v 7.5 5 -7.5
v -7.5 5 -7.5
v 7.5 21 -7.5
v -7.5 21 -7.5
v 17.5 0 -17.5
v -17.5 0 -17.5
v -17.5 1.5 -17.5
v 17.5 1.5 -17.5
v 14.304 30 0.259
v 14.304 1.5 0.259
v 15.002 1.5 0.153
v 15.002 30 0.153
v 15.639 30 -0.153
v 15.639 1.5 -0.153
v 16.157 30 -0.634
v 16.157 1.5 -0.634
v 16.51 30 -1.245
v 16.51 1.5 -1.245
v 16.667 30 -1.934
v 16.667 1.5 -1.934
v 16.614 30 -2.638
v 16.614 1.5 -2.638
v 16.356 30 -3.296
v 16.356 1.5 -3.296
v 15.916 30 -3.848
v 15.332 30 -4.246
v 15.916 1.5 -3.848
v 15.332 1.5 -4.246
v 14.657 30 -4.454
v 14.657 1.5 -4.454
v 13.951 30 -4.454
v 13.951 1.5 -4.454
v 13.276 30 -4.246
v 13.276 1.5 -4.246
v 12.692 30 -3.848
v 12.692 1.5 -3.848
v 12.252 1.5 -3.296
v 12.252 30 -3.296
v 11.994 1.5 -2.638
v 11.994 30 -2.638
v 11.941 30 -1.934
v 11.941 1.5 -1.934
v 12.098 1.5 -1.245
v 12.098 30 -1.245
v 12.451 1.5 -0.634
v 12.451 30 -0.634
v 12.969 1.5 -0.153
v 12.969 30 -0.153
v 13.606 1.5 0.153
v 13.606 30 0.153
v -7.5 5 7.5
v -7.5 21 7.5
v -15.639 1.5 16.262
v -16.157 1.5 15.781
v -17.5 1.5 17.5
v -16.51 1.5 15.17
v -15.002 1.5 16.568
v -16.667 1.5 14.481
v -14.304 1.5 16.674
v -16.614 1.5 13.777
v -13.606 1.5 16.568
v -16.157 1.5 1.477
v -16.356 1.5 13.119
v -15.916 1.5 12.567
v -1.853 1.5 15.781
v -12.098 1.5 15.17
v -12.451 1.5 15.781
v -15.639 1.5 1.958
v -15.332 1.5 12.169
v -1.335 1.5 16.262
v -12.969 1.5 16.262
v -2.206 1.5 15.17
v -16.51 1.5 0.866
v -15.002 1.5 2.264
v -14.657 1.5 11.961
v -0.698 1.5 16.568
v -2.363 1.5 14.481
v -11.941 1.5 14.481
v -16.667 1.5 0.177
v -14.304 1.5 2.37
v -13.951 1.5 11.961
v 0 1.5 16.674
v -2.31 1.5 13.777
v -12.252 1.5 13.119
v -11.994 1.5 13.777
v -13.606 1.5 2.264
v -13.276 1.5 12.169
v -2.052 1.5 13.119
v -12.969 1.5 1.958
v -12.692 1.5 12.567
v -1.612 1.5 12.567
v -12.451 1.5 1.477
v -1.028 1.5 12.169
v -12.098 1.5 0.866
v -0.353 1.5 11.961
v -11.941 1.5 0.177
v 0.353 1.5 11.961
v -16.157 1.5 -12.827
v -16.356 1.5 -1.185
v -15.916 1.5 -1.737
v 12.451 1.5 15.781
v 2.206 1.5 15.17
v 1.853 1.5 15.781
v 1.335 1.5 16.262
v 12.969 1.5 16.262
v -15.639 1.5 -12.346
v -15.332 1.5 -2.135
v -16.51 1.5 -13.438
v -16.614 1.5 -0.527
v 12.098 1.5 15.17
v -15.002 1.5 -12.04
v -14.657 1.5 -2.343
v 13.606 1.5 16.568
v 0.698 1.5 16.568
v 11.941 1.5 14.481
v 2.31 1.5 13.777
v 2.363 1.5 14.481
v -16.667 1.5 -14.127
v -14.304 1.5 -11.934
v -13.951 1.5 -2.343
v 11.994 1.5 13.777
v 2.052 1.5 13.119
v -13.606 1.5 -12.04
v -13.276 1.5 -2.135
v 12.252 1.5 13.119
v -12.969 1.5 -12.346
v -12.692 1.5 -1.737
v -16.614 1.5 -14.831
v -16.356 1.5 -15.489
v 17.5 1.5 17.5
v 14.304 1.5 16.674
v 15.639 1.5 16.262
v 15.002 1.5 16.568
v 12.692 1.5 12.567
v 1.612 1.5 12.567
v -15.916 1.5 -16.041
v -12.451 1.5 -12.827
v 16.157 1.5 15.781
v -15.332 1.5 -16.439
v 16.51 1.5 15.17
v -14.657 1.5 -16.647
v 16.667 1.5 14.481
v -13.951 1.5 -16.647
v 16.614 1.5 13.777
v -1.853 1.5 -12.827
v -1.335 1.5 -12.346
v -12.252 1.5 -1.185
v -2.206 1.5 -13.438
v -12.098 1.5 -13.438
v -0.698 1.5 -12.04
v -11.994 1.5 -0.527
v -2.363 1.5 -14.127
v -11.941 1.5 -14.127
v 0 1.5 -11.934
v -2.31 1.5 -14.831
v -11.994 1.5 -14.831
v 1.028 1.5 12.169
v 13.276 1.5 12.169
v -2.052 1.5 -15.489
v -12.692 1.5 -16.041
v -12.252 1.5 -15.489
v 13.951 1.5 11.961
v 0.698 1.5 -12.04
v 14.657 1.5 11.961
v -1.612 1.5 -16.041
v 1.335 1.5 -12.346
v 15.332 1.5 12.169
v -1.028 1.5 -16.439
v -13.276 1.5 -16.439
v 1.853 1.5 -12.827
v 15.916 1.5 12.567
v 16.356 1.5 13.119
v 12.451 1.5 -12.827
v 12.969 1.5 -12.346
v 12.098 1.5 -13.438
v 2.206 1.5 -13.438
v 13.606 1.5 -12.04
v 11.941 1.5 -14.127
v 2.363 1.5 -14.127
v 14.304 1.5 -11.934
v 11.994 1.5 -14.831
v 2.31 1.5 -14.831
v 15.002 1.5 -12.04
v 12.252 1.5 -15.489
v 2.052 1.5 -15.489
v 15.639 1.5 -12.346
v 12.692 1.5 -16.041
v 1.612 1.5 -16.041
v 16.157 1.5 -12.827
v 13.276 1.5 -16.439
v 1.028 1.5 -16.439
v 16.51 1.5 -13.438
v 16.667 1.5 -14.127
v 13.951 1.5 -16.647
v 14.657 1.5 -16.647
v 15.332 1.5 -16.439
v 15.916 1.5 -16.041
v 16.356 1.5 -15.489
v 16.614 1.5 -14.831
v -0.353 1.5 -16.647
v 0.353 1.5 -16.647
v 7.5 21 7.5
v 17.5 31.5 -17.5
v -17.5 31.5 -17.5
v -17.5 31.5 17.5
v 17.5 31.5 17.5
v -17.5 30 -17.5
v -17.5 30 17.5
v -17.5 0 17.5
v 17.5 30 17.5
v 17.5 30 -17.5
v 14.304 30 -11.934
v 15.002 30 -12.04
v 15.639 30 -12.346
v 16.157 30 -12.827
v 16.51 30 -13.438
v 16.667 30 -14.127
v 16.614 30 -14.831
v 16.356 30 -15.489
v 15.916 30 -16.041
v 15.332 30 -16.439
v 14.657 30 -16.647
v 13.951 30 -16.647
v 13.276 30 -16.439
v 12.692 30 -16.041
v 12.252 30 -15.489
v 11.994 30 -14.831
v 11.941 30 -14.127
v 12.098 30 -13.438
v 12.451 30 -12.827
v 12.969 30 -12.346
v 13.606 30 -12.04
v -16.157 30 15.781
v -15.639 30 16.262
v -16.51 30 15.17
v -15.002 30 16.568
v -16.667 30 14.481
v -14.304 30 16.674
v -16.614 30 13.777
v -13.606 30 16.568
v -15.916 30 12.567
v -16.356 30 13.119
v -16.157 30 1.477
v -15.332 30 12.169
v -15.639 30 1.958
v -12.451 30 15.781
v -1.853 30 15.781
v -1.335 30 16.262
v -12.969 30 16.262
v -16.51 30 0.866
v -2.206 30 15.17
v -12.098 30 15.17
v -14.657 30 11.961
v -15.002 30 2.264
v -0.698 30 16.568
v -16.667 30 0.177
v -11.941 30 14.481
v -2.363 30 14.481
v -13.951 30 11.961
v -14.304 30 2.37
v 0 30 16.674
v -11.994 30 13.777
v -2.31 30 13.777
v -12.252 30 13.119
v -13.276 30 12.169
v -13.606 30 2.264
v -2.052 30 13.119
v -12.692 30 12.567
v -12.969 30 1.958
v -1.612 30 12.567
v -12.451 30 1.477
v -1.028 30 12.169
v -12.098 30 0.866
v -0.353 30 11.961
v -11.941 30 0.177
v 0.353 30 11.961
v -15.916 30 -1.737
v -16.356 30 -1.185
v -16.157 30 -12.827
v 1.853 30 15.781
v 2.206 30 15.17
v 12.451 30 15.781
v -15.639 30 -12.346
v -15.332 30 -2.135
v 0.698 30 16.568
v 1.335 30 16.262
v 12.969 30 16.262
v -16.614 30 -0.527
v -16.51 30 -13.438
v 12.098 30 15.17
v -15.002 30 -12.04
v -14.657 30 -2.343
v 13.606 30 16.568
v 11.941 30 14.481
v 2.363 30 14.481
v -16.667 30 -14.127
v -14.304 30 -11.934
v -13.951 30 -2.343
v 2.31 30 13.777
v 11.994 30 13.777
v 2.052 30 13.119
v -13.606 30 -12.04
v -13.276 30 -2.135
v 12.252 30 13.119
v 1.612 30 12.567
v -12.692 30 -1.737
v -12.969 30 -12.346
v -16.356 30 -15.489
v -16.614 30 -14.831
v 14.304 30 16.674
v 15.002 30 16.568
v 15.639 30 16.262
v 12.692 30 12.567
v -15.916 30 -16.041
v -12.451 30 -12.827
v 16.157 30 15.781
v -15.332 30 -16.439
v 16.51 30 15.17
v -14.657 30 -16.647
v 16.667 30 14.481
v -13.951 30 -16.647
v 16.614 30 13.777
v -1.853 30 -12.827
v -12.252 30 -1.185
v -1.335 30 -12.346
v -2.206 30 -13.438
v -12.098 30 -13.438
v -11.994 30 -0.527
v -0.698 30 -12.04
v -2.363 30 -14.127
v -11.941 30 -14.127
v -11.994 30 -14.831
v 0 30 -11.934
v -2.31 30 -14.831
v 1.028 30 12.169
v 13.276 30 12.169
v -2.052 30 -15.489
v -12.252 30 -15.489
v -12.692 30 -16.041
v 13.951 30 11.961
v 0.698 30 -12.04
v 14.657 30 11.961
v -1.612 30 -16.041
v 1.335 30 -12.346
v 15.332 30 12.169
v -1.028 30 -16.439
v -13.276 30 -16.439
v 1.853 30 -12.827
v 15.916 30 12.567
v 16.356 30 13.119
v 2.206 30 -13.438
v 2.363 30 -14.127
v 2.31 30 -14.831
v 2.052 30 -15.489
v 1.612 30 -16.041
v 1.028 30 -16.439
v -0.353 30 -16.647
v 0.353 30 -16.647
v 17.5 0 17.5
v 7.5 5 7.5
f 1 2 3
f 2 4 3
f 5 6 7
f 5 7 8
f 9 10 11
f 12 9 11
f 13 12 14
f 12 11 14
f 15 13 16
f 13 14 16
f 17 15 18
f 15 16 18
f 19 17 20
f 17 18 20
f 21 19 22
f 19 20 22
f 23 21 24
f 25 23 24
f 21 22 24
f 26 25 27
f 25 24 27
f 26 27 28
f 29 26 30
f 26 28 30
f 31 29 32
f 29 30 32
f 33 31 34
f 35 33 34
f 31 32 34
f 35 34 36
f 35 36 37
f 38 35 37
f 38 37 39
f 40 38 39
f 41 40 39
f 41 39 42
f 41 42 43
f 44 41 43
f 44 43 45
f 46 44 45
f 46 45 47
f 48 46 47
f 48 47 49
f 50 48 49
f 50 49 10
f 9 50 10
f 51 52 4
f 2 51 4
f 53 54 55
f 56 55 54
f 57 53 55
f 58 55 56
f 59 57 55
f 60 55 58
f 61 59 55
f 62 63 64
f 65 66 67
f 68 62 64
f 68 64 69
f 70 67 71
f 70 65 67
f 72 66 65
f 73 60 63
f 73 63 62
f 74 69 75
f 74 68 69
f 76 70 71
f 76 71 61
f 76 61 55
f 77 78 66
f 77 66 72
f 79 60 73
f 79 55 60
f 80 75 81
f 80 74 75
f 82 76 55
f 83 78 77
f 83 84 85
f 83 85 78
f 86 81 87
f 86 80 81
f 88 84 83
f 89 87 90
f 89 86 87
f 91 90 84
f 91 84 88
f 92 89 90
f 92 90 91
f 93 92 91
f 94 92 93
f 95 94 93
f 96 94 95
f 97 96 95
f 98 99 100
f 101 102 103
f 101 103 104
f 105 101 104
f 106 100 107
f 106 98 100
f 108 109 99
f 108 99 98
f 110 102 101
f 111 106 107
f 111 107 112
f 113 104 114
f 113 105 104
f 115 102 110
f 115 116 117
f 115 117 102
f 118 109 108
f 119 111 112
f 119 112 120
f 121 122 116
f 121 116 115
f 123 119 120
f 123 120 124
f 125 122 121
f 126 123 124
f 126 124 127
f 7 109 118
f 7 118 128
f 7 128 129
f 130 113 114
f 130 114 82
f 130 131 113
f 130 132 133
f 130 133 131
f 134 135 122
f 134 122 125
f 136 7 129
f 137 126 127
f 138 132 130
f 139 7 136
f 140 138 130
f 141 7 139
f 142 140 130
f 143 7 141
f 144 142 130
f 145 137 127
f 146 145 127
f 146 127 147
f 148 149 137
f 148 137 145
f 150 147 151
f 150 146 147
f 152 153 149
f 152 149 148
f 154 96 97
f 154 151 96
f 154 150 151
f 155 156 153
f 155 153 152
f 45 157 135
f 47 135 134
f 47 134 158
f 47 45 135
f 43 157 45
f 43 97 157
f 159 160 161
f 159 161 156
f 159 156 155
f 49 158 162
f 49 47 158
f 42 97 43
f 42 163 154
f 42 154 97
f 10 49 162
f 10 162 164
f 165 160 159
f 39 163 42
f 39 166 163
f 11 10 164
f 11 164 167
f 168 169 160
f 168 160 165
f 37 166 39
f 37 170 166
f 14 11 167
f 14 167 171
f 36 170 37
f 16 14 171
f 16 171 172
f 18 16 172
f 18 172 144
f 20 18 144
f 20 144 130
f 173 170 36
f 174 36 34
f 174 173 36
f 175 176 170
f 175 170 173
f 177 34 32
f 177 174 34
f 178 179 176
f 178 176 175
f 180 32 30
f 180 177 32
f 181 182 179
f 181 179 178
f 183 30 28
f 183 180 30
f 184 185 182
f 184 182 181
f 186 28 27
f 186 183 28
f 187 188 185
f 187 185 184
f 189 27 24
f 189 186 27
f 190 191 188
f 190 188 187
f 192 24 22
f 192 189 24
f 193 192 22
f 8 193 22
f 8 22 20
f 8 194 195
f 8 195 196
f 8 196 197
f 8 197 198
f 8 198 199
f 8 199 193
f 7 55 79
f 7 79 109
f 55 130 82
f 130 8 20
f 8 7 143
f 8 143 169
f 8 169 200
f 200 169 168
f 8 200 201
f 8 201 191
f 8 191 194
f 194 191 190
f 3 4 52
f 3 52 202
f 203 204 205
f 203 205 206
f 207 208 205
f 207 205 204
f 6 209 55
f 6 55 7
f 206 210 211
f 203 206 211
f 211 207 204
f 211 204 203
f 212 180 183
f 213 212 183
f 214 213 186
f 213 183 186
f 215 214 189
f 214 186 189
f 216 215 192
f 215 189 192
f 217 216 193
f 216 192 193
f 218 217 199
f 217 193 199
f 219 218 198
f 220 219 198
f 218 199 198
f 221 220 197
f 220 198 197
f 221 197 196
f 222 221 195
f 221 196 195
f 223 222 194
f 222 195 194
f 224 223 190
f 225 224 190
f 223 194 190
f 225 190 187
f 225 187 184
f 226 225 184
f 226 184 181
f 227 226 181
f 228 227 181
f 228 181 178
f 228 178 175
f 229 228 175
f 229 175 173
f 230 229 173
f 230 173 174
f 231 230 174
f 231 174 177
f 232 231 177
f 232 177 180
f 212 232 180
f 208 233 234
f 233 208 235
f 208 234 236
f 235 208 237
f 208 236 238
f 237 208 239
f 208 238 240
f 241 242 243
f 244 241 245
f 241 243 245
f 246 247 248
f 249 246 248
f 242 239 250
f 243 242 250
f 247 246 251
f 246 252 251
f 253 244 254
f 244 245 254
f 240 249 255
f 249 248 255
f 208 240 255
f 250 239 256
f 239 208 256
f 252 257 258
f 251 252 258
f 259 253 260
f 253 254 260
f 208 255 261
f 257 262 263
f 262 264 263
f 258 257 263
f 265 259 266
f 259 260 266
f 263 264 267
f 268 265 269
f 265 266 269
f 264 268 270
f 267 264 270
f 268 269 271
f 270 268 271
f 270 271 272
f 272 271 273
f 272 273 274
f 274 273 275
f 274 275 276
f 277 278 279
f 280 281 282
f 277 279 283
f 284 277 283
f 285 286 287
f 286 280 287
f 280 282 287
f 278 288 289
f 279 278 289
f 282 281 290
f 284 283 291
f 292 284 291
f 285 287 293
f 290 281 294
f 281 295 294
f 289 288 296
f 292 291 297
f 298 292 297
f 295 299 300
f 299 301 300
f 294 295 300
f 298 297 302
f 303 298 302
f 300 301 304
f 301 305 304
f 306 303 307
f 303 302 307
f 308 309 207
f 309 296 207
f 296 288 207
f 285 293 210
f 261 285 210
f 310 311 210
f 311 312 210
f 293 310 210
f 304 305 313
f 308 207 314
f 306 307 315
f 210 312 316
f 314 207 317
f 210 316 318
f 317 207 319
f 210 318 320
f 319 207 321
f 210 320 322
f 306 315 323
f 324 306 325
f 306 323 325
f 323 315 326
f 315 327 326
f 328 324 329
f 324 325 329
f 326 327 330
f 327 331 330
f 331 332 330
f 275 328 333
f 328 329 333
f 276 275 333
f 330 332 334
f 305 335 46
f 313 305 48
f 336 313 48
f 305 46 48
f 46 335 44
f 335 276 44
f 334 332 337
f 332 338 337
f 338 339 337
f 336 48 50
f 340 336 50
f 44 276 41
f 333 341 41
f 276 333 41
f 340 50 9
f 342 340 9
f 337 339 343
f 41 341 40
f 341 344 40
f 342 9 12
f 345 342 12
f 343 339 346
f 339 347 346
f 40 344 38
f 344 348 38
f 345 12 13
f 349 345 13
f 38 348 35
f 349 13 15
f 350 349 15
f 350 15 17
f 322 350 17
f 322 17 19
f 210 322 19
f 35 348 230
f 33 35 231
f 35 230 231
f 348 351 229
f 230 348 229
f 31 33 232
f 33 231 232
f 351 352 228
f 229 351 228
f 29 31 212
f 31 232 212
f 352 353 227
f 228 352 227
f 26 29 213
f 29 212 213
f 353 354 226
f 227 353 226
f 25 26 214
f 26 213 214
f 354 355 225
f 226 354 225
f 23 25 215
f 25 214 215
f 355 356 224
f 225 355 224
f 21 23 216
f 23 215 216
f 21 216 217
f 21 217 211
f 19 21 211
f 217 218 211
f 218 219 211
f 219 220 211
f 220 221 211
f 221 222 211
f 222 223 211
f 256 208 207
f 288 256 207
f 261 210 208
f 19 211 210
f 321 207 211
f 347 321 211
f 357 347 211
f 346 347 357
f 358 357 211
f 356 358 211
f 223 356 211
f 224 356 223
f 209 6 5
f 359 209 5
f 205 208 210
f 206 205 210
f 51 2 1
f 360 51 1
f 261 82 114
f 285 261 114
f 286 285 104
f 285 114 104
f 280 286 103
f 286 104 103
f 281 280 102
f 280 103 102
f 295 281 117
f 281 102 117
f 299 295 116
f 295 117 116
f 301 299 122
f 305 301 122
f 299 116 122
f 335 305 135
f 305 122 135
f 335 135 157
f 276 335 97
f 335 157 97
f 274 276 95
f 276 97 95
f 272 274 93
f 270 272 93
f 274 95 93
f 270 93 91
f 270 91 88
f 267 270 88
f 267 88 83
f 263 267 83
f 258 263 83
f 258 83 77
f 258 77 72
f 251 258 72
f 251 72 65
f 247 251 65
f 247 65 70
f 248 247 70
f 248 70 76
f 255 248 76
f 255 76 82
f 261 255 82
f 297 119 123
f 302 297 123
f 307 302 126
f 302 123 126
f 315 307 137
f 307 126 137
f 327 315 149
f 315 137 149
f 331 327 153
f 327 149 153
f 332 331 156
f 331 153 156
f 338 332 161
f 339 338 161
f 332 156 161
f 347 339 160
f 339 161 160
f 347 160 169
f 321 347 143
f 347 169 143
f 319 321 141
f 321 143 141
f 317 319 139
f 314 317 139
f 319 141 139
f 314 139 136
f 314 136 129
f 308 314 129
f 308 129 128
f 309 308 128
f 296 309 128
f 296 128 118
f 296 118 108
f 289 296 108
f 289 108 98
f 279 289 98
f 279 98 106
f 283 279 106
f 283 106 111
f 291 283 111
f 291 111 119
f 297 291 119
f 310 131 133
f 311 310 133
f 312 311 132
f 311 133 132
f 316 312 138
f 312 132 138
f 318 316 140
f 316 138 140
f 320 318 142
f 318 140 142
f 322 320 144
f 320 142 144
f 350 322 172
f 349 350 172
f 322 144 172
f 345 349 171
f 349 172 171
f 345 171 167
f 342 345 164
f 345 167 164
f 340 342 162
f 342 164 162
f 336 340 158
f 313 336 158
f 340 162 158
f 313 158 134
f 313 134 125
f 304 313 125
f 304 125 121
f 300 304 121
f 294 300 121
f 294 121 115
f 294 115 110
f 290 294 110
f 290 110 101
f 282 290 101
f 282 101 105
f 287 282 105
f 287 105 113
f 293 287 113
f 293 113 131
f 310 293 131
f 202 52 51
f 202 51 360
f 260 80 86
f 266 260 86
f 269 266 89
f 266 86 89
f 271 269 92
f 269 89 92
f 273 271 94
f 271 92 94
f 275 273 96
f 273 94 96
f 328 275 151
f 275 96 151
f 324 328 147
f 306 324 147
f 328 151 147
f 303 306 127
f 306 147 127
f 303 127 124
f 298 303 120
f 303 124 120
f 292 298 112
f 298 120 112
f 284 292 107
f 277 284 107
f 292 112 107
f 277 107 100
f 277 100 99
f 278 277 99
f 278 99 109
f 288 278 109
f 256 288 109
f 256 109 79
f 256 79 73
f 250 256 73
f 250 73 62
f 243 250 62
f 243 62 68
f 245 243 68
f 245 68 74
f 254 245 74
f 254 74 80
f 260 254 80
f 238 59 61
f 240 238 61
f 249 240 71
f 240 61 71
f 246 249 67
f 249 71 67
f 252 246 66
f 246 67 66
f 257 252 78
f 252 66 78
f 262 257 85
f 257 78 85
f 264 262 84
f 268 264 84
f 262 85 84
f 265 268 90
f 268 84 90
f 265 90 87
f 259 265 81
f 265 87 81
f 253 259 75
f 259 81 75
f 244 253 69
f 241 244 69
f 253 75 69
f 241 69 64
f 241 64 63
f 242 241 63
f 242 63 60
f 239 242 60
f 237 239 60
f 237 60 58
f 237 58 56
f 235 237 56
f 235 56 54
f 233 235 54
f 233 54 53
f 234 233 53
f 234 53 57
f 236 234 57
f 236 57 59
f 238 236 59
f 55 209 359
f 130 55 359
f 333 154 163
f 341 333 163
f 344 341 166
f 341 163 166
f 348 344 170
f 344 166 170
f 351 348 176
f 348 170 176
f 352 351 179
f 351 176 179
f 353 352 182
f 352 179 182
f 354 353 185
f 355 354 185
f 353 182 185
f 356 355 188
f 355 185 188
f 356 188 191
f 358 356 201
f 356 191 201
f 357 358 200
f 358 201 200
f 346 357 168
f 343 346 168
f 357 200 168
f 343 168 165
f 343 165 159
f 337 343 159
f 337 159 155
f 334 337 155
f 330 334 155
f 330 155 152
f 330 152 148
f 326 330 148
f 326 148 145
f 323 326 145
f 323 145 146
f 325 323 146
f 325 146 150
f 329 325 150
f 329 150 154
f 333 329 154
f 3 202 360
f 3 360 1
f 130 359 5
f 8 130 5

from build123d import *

# Parameters (mm, degrees)
SKETCH9_R                = 2.369598006
BOSS_EXTRUDE4_DEPTH      = 30
BOSS_EXTRUDE4_2_DEPTH    = 30
BOSS_EXTRUDE4_3_DEPTH    = 30
BOSS_EXTRUDE4_4_DEPTH    = 30
BOSS_EXTRUDE4_5_DEPTH    = 30
BOSS_EXTRUDE4_6_DEPTH    = 30
BOSS_EXTRUDE4_7_DEPTH    = 30
BOSS_EXTRUDE4_8_DEPTH    = 30
BOSS_EXTRUDE5_START      = 20
SKETCH10_W               = 15
SKETCH10_H               = 15
BOSS_EXTRUDE5_DEPTH      = 1
BOSS_EXTRUDE5_DEPTH_BACK = 15
SKETCH11_W               = 35
SKETCH11_H               = 35
BOSS_EXTRUDE6_DEPTH      = 1.5
BOSS_EXTRUDE7_START      = 30
SKETCH13_W               = 35
SKETCH13_H               = 35
BOSS_EXTRUDE7_DEPTH      = 1.5


with BuildPart() as part:
    # Sketch9 → Boss-Extrude4 (new body)
    with BuildSketch(Plane(origin=(0, 0, 0), x_dir=(1, 0, 0), z_dir=(0, 1, 0))):
        with Locations(Location((-14.303992388, 14.303992388, 0), (0, 0, 270))):  # turned: the seam where the file's is
            Circle(SKETCH9_R)
    extrude(amount=BOSS_EXTRUDE4_DEPTH)



with BuildPart() as body_2:
    # Sketch9 → Boss-Extrude4 2 (new body)
    with BuildSketch(Plane(origin=(0, 0, 0), x_dir=(1, 0, 0), z_dir=(0, 1, 0))):
        with Locations(Location((14.303992388, 14.303992388, 0), (0, 0, 270))):  # turned: the seam where the file's is
            Circle(SKETCH9_R)
    extrude(amount=BOSS_EXTRUDE4_2_DEPTH)


with BuildPart() as body_3:
    # Sketch9 → Boss-Extrude4 3 (new body)
    with BuildSketch(Plane(origin=(0, 0, 0), x_dir=(1, 0, 0), z_dir=(0, 1, 0))):
        with Locations(Location((14.303992388, -14.303992388, 0), (0, 0, 270))):  # turned: the seam where the file's is
            Circle(SKETCH9_R)
    extrude(amount=BOSS_EXTRUDE4_3_DEPTH)


with BuildPart() as body_4:
    # Sketch9 → Boss-Extrude4 4 (new body)
    with BuildSketch(Plane(origin=(0, 0, 0), x_dir=(1, 0, 0), z_dir=(0, 1, 0))):
        with Locations(Location((-14.303992388, -14.303992388, 0), (0, 0, 270))):  # turned: the seam where the file's is
            Circle(SKETCH9_R)
    extrude(amount=BOSS_EXTRUDE4_4_DEPTH)


with BuildPart() as body_5:
    # Sketch9 → Boss-Extrude4 5 (new body)
    with BuildSketch(Plane(origin=(0, 0, 0), x_dir=(1, 0, 0), z_dir=(0, 1, 0))):
        with Locations(Location((-14.303992388, 0, 0), (0, 0, 270))):  # turned: the seam where the file's is
            Circle(SKETCH9_R)
    extrude(amount=BOSS_EXTRUDE4_5_DEPTH)


with BuildPart() as body_6:
    # Sketch9 → Boss-Extrude4 6 (new body)
    with BuildSketch(Plane(origin=(0, 0, 0), x_dir=(1, 0, 0), z_dir=(0, 1, 0))):
        with Locations(Location((0, -14.303992388, 0), (0, 0, 270))):  # turned: the seam where the file's is
            Circle(SKETCH9_R)
    extrude(amount=BOSS_EXTRUDE4_6_DEPTH)


with BuildPart() as body_7:
    # Sketch9 → Boss-Extrude4 7 (new body)
    with BuildSketch(Plane(origin=(0, 0, 0), x_dir=(1, 0, 0), z_dir=(0, 1, 0))):
        with Locations(Location((14.303992388, 2.110985408, 0), (0, 0, 270))):  # turned: the seam where the file's is
            Circle(SKETCH9_R)
    extrude(amount=BOSS_EXTRUDE4_7_DEPTH)


with BuildPart() as body_8:
    # Sketch9 → Boss-Extrude4 8 (new body)
    with BuildSketch(Plane(origin=(0, 0, 0), x_dir=(1, 0, 0), z_dir=(0, 1, 0))):
        with Locations(Location((0, 14.303992388, 0), (0, 0, 270))):  # turned: the seam where the file's is
            Circle(SKETCH9_R)
    extrude(amount=BOSS_EXTRUDE4_8_DEPTH)


with BuildPart() as body_9:
    # Sketch10 → Boss-Extrude5 (new body, two sides)
    with BuildSketch(Plane(origin=(0, 0, 0), x_dir=(1, 0, 0), z_dir=(0, 1, 0)).offset(BOSS_EXTRUDE5_START)) as boss_extrude5_sk:
        Rectangle(SKETCH10_W, SKETCH10_H)
    extrude(amount=BOSS_EXTRUDE5_DEPTH)
    extrude(boss_extrude5_sk.sketch, amount=-BOSS_EXTRUDE5_DEPTH_BACK)


with BuildPart() as part_1:
    add(part.part)

    add(body_2.part)  # Boss-Extrude6 merges body 2

    add(body_3.part)  # Boss-Extrude6 merges body 3

    add(body_4.part)  # Boss-Extrude6 merges body 4

    add(body_5.part)  # Boss-Extrude6 merges body 5

    add(body_6.part)  # Boss-Extrude6 merges body 6

    add(body_7.part)  # Boss-Extrude6 merges body 7

    add(body_8.part)  # Boss-Extrude6 merges body 8
    # Sketch11 → Boss-Extrude6 (add)
    with BuildSketch(Plane(origin=(0, 0, 0), x_dir=(1, 0, 0), z_dir=(0, 1, 0))):
        Rectangle(SKETCH11_W, SKETCH11_H)
    extrude(amount=BOSS_EXTRUDE6_DEPTH)

    # Sketch13 → Boss-Extrude7 (add)
    with BuildSketch(Plane(origin=(0, 0, 0), x_dir=(1, 0, 0), z_dir=(0, 1, 0)).offset(BOSS_EXTRUDE7_START)):
        Rectangle(SKETCH13_W, SKETCH13_H)
    extrude(amount=BOSS_EXTRUDE7_DEPTH)


solid = Compound([body_9.part, part_1.part])
